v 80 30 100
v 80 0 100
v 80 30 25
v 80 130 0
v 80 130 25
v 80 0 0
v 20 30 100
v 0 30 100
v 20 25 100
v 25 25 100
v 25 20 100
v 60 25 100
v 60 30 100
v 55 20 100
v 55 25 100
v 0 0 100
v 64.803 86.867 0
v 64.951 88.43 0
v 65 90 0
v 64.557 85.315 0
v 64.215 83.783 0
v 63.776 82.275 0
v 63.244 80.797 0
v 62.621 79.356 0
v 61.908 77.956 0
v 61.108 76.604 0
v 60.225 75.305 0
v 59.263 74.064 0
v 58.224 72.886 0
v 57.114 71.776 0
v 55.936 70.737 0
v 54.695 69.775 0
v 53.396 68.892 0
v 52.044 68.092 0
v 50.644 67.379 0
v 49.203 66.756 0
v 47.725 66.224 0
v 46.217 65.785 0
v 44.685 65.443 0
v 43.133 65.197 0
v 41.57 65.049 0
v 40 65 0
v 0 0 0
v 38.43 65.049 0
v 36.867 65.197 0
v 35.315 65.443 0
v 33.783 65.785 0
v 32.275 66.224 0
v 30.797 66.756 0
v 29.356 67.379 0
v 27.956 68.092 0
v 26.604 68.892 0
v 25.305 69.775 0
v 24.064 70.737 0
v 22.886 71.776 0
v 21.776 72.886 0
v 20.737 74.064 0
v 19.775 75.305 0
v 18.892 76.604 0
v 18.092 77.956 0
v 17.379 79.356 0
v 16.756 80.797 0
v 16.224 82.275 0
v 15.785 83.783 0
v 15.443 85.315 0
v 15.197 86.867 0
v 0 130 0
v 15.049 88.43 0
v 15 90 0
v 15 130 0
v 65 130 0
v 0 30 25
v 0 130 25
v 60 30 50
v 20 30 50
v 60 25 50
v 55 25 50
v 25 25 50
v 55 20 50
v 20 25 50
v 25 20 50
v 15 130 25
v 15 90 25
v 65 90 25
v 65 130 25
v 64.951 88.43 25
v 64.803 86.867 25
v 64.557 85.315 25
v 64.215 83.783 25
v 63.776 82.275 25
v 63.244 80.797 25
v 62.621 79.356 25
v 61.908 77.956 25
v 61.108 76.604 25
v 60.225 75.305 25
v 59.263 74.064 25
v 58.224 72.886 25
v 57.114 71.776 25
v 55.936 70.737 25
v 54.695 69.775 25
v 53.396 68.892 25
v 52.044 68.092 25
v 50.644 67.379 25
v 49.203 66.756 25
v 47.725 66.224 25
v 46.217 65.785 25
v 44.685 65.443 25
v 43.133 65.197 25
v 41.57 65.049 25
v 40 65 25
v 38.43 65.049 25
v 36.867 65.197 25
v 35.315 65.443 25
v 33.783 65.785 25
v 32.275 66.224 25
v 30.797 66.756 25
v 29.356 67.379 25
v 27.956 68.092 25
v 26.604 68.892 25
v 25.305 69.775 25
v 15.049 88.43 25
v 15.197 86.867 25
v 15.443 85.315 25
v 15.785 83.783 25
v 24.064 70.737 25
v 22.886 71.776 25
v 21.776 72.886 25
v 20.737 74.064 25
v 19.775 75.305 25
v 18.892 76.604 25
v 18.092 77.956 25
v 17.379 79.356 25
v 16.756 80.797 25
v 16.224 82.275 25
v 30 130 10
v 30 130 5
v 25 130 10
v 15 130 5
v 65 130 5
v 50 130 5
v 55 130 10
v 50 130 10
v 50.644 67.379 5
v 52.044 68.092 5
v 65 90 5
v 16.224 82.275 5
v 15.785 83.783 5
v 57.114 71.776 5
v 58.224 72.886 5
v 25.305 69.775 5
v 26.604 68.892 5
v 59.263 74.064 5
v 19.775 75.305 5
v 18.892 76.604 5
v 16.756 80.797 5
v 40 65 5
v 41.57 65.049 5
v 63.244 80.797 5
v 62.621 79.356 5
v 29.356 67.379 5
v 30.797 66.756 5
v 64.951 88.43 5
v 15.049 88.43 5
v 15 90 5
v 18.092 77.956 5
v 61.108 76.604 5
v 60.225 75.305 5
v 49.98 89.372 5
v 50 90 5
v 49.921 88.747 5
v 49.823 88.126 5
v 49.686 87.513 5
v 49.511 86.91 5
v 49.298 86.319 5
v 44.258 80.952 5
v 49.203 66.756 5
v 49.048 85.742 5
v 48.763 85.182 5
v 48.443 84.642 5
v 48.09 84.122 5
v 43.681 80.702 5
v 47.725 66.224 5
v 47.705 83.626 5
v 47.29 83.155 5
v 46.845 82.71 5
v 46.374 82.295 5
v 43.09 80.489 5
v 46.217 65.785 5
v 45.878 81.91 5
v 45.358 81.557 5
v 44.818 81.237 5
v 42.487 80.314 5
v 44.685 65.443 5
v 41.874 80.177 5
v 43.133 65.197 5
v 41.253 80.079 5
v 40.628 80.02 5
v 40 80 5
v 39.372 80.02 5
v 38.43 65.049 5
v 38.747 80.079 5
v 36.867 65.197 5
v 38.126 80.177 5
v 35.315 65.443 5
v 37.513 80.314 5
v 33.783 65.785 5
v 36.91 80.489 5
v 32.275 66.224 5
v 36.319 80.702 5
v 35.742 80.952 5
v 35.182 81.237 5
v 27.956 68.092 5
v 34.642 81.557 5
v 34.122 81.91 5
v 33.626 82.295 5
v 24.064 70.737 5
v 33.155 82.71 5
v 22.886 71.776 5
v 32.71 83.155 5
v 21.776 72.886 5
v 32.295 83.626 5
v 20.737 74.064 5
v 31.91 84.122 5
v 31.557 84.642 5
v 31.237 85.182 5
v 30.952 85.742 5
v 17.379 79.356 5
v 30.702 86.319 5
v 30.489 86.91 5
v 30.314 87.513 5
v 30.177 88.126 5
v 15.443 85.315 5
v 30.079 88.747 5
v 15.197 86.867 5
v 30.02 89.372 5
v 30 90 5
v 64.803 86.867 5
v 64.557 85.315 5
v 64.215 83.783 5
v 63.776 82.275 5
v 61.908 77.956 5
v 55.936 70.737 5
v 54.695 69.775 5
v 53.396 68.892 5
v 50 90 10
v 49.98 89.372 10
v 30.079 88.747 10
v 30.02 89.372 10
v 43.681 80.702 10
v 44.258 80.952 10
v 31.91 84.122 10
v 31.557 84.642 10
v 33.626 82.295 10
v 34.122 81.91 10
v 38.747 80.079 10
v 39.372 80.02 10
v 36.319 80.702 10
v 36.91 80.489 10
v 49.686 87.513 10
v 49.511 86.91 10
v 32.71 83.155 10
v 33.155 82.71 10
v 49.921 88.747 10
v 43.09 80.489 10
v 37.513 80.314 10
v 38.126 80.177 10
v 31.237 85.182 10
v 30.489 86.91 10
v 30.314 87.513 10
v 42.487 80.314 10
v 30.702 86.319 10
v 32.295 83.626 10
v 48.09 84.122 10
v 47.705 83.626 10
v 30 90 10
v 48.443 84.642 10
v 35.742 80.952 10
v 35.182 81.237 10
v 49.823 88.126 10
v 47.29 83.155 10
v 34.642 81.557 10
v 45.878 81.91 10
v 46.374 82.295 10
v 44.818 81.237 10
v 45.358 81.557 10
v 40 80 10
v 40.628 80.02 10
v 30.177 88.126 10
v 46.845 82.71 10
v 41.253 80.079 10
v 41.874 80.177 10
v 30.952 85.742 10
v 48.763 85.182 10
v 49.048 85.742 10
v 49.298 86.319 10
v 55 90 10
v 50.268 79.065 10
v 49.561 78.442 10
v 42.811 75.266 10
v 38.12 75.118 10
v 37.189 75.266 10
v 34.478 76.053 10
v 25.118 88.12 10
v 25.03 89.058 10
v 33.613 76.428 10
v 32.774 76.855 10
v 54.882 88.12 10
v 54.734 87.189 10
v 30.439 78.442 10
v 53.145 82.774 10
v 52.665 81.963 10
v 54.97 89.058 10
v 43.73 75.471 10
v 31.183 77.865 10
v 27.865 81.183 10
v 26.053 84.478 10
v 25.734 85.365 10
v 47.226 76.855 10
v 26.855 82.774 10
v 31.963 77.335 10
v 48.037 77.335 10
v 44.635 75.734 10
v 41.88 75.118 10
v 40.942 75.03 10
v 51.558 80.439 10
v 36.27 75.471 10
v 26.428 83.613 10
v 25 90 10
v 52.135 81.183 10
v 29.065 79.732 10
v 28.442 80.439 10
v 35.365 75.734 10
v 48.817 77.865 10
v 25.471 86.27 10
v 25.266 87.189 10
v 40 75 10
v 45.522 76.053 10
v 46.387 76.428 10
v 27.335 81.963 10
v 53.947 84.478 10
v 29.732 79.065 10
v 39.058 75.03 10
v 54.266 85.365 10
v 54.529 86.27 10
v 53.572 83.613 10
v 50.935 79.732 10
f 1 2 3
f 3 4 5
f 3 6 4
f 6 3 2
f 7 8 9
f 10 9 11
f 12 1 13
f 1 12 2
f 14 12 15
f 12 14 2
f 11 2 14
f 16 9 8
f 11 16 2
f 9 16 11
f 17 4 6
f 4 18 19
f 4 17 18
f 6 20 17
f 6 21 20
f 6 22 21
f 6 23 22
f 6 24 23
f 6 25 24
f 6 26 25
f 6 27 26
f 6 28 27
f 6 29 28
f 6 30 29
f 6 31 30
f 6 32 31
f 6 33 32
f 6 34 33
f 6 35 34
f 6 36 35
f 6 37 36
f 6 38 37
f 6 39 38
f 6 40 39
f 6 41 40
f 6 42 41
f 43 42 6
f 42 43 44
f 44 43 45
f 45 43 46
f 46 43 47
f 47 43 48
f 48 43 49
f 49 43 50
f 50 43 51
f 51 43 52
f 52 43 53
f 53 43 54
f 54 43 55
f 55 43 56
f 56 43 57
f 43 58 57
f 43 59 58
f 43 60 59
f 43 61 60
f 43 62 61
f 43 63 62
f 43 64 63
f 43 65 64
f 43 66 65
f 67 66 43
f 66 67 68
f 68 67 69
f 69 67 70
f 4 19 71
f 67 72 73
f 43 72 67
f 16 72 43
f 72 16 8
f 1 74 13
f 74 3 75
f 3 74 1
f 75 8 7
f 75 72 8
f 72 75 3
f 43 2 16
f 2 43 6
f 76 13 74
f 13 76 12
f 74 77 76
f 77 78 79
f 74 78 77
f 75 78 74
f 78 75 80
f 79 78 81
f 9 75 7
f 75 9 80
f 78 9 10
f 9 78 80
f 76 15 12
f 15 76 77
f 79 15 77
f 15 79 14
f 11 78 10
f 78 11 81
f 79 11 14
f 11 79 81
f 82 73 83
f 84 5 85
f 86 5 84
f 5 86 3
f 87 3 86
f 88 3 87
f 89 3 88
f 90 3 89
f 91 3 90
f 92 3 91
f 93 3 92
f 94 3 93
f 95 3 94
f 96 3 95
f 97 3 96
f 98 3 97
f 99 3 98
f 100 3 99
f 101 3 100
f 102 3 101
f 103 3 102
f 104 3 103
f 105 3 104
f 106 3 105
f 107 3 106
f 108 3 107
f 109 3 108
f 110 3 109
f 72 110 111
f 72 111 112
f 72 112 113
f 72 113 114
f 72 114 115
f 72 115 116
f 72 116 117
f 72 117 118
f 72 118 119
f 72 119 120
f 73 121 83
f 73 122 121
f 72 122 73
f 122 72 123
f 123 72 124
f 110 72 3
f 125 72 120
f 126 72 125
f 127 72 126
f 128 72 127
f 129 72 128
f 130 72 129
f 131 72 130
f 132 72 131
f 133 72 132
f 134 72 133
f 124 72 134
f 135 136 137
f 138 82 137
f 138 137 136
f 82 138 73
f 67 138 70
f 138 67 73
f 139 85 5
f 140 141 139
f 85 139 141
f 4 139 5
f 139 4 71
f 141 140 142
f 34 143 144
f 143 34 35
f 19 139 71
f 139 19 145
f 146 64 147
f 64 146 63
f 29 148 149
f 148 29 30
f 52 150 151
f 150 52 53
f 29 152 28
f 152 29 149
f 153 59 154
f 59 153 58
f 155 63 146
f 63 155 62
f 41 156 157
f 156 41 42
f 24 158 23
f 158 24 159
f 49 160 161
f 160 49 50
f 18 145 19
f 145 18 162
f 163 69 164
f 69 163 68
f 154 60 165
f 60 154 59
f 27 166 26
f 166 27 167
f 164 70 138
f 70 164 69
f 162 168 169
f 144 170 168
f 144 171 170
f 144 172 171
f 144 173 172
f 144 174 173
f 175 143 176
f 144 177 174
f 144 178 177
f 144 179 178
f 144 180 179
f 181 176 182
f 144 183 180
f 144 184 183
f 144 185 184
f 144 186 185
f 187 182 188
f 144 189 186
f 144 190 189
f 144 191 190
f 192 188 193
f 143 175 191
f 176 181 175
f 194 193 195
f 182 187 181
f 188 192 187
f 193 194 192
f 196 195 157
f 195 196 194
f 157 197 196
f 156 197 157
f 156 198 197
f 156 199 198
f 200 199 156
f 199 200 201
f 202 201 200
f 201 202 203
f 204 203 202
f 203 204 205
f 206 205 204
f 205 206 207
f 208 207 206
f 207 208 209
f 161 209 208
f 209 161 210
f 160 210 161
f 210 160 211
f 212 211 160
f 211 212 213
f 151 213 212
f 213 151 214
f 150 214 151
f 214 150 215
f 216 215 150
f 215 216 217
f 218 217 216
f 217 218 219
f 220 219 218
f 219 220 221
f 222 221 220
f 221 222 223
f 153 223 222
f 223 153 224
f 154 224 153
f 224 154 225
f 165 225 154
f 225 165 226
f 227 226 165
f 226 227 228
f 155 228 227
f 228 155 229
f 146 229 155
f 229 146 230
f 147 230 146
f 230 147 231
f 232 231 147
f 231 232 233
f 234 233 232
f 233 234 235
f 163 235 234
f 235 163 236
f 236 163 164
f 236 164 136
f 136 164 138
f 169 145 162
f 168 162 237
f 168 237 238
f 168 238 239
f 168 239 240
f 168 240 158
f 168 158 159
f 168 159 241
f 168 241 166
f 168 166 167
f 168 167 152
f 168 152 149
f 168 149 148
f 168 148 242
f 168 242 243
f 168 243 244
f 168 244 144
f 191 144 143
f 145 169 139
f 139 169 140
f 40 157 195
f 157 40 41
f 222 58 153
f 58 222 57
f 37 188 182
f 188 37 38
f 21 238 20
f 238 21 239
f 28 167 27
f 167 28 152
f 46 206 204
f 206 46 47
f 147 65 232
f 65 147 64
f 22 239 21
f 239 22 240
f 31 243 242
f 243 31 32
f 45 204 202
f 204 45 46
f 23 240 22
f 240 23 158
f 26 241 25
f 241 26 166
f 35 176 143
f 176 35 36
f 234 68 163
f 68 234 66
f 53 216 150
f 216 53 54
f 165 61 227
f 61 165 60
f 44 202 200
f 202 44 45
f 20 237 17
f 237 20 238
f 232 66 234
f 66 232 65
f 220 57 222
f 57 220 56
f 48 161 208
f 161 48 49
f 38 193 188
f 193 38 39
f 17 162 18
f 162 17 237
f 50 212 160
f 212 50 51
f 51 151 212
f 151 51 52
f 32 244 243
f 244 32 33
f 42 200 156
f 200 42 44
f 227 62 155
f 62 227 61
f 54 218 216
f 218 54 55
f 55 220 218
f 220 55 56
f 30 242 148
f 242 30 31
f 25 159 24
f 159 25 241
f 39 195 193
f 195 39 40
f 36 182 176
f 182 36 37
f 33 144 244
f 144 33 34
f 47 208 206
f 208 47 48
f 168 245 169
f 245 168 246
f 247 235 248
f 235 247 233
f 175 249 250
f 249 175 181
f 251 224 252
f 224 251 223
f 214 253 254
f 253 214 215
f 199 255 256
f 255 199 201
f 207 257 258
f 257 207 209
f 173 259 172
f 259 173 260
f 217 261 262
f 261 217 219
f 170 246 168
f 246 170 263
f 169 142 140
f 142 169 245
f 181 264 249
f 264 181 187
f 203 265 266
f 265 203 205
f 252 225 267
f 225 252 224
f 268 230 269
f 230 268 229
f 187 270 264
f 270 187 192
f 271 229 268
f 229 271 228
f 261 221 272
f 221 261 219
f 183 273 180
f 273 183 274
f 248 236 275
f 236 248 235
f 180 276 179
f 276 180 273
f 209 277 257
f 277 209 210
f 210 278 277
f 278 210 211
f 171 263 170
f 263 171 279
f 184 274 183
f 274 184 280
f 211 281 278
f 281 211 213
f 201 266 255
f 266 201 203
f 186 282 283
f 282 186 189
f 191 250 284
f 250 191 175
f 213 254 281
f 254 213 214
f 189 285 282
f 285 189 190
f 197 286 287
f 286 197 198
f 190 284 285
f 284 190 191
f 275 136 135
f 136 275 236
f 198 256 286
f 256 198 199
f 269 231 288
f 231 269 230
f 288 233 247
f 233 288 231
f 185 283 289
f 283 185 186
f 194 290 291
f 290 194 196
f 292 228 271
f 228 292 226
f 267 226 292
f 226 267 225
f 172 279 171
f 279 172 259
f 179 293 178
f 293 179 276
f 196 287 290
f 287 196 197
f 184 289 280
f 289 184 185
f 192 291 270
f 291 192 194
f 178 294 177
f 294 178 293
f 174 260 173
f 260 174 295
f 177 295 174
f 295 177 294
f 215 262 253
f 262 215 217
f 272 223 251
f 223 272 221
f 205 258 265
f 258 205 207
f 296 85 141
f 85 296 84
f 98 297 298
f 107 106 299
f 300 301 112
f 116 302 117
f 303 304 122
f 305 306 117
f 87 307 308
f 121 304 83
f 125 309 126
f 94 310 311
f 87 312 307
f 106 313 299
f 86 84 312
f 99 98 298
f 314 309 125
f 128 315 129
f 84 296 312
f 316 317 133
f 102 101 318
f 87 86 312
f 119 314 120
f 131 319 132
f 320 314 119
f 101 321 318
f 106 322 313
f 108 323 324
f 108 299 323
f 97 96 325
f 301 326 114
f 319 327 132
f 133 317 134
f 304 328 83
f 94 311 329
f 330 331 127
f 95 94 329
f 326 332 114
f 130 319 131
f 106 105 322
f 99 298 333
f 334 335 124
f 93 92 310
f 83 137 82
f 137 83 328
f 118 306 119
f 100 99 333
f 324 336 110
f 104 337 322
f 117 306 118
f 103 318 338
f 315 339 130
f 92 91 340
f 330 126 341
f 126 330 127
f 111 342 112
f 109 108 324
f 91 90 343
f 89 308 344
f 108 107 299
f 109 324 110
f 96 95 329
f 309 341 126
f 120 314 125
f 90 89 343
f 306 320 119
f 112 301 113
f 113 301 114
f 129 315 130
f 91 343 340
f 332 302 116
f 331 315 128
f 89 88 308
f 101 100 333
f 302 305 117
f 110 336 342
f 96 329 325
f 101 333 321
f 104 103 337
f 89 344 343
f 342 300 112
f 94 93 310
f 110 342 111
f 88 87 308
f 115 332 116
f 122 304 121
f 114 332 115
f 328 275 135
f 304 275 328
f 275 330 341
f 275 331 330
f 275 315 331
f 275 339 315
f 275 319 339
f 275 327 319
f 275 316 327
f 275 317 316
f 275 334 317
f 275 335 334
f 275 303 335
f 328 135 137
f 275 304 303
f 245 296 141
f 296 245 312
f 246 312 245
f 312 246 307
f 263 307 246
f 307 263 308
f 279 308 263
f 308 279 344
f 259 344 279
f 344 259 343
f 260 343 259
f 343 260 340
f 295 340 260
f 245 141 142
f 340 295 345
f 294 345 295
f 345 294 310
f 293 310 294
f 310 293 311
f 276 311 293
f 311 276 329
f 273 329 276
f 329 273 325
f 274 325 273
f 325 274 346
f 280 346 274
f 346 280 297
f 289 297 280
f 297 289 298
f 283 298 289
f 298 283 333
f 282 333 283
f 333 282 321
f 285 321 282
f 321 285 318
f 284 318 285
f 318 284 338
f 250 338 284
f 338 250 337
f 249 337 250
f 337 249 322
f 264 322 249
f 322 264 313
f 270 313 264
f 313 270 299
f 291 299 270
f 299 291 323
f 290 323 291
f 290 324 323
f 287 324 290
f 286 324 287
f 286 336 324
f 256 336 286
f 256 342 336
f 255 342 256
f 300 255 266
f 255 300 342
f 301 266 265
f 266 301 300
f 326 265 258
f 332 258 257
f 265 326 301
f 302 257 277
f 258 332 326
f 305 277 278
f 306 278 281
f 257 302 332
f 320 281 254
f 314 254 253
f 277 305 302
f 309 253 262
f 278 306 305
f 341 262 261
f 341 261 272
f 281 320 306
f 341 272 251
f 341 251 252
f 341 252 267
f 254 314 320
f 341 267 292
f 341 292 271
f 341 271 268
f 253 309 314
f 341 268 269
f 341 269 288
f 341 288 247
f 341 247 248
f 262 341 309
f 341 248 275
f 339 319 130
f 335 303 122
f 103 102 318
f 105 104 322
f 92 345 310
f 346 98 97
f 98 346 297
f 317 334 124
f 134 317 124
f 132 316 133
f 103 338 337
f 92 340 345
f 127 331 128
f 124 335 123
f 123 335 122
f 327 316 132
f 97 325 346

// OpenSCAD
// file: Library_2021.scad
$fn = 100;//This number should normally be around or at 100.


//===========================================================================================================================
//===========================================================================================================================
module sqaure_torus(outerXlength, outerYlength, innerXlength, innerYlength, obritalDis, angleHere){//Sqaure torus
rotate_extrude(angle = angleHere,convexity = 10){
translate([obritalDis + outerXlength / 2, outerYlength / 2, 0])
    difference(){
        square([outerXlength, outerYlength], center = true);
        square([innerXlength, innerYlength], center = true);
        
        }
    }
}
//===========================================================================================================================
//===========================================================================================================================
module torus(outerRadius, innerRadius, orbitalDistance, angleHere){// Donut shape
    rotate_extrude(angle= angleHere, convexity= 10){
        translate([orbitalDistance, 0, 0])
            difference(){
                circle(outerRadius);
                circle(innerRadius);
                }
        }
    assert(angleHere <= 360, "angle is greater than 360!");
    assert(outerRadius > innerRadius, "Inner circle is greater than outer circle!");
    assert(orbitalDistance > 0, "orbital radius is less than zero!");
    }
//===========================================================================================================================
//===========================================================================================================================
module orbital_cylinders(OrbitalRadius, NumberOfCylinders, cylinderRadius, Height, Xtilt, Ytilt){// cuts circles in a circle
    for (Hole = [0:NumberOfCylinders]){
        rotate([0, 0, 360/NumberOfCylinders])
        translate([OrbitalRadius, 0, 0])
        rotate([Xtilt, Ytilt,0])
            cylinder(Height, r= cylinderRadius);
        }
    }
//===========================================================================================================================
//===========================================================================================================================
module annulus(OuterRadius, InnerRadius, Height){//Pipe shape
    differnce(){
        //Prime object
        cylinder(Height, r= OuterRadius);
        //Cutting object(s)
        cylinder(Height, r= InnerRadius);
        }
    }
//==========================================================================================================================
//==========================================================================================================================
module ceinture(OuterRadius, InnerRadius, Height, BetweenCenters){// Belt shape
    difference(){
        hull(){//Prime object
            cylinder(Height, r= outerRadius);
            translate([BetweenCenters, 0, 0])
                cylinder(Height, r= outerRadius);
            }
        hull(){//Cutting object
            cylinder(Height, r= InnerRadius);
            translate([BetweenCenters, 0, 0])
                cylinder(Height, r= InnerRadius);
            }
        }
    }
//==========================================================================================================================
//==========================================================================================================================
module triangle(type, leg_a, leg_b,hypotenuse){// draws right, scalene, isosceles and equilateral triangles
    if(type == "right"){
        polygon( points = [[0, 0],[leg_a, 0],[0, leg_b]]);
            }
        else if(type == "scalene"){
            hypotenuse = sqrt(pow(leg_a, 2) + pow(leg_b, 2));
                polygon(points = [[0,-(leg_a/2)],[leg_b,0],[0,hypotenuse]]);
            }
        else if(type == "isosceles"){
                polygon(points = [[0,-(leg_a/2)],[leg_b,0],[0,(leg_a/2)]]);
            }
        else if(type == "equilateral"){
                polygon(points = [[0,-(leg_a/2)],[leg_a,0],[0,leg_a]]);
            }
    }
//==========================================================================================================================
//==========================================================================================================================
module _name_(){}
//==========================================================================================================================
//==========================================================================================================================
module _name_(){}
//==========================================================================================================================
//==========================================================================================================================
module _name_(){}
//==========================================================================================================================
//==========================================================================================================================
// main file
$fn = 100;
mm = 1;
in = 25.4 * mm;
u = 1;
degree = 1;
diameter = .5;
p1=$preview?1+1/$fn:1;
use <Library_2021.scad>


Part_178();

module Part_178(){
    baseVertX = 80;
    baseVertY = 30;
    baseVertZ = 100;
    
    baseHoriX = 80;
    baseHoriY = 130;
    baseHoriZ = 25;
    
    cubeCutHeight = 50;
    
    difference(){
        cube([baseVertX, baseVertY, baseVertZ]);//Vert
            translate([baseVertX / 4,baseVertY - 5, baseVertZ - cubeCutHeight])cube([40, 5, cubeCutHeight]);
            translate([baseVertX / 4 + 5,baseVertY - 10, baseVertZ - cubeCutHeight])cube([30, 10, cubeCutHeight]);
        }
    
    difference(){
        cube([baseHoriX, baseHoriY, baseHoriZ]);//Hori
        hull(){
            translate([baseVertX / 2, baseHoriY, 0])cylinder(5,d= 50);
            translate([baseVertX / 2, baseHoriY - 40, 0])cylinder(5,d= 50);
            }
        hull(){
            translate([baseVertX / 2, baseHoriY, 0])cylinder(baseHoriZ,d= 20);
            translate([baseVertX / 2, baseHoriY - 40, 0])cylinder(baseHoriZ,d= 20);
            }
        hull(){
            translate([baseVertX / 2, baseHoriY, 10])cylinder(15,d2= 50,d1= 30);
            translate([baseVertX / 2, baseHoriY - 40, 10])cylinder(15,d2= 50,d1= 30);
            }
        }
    }
